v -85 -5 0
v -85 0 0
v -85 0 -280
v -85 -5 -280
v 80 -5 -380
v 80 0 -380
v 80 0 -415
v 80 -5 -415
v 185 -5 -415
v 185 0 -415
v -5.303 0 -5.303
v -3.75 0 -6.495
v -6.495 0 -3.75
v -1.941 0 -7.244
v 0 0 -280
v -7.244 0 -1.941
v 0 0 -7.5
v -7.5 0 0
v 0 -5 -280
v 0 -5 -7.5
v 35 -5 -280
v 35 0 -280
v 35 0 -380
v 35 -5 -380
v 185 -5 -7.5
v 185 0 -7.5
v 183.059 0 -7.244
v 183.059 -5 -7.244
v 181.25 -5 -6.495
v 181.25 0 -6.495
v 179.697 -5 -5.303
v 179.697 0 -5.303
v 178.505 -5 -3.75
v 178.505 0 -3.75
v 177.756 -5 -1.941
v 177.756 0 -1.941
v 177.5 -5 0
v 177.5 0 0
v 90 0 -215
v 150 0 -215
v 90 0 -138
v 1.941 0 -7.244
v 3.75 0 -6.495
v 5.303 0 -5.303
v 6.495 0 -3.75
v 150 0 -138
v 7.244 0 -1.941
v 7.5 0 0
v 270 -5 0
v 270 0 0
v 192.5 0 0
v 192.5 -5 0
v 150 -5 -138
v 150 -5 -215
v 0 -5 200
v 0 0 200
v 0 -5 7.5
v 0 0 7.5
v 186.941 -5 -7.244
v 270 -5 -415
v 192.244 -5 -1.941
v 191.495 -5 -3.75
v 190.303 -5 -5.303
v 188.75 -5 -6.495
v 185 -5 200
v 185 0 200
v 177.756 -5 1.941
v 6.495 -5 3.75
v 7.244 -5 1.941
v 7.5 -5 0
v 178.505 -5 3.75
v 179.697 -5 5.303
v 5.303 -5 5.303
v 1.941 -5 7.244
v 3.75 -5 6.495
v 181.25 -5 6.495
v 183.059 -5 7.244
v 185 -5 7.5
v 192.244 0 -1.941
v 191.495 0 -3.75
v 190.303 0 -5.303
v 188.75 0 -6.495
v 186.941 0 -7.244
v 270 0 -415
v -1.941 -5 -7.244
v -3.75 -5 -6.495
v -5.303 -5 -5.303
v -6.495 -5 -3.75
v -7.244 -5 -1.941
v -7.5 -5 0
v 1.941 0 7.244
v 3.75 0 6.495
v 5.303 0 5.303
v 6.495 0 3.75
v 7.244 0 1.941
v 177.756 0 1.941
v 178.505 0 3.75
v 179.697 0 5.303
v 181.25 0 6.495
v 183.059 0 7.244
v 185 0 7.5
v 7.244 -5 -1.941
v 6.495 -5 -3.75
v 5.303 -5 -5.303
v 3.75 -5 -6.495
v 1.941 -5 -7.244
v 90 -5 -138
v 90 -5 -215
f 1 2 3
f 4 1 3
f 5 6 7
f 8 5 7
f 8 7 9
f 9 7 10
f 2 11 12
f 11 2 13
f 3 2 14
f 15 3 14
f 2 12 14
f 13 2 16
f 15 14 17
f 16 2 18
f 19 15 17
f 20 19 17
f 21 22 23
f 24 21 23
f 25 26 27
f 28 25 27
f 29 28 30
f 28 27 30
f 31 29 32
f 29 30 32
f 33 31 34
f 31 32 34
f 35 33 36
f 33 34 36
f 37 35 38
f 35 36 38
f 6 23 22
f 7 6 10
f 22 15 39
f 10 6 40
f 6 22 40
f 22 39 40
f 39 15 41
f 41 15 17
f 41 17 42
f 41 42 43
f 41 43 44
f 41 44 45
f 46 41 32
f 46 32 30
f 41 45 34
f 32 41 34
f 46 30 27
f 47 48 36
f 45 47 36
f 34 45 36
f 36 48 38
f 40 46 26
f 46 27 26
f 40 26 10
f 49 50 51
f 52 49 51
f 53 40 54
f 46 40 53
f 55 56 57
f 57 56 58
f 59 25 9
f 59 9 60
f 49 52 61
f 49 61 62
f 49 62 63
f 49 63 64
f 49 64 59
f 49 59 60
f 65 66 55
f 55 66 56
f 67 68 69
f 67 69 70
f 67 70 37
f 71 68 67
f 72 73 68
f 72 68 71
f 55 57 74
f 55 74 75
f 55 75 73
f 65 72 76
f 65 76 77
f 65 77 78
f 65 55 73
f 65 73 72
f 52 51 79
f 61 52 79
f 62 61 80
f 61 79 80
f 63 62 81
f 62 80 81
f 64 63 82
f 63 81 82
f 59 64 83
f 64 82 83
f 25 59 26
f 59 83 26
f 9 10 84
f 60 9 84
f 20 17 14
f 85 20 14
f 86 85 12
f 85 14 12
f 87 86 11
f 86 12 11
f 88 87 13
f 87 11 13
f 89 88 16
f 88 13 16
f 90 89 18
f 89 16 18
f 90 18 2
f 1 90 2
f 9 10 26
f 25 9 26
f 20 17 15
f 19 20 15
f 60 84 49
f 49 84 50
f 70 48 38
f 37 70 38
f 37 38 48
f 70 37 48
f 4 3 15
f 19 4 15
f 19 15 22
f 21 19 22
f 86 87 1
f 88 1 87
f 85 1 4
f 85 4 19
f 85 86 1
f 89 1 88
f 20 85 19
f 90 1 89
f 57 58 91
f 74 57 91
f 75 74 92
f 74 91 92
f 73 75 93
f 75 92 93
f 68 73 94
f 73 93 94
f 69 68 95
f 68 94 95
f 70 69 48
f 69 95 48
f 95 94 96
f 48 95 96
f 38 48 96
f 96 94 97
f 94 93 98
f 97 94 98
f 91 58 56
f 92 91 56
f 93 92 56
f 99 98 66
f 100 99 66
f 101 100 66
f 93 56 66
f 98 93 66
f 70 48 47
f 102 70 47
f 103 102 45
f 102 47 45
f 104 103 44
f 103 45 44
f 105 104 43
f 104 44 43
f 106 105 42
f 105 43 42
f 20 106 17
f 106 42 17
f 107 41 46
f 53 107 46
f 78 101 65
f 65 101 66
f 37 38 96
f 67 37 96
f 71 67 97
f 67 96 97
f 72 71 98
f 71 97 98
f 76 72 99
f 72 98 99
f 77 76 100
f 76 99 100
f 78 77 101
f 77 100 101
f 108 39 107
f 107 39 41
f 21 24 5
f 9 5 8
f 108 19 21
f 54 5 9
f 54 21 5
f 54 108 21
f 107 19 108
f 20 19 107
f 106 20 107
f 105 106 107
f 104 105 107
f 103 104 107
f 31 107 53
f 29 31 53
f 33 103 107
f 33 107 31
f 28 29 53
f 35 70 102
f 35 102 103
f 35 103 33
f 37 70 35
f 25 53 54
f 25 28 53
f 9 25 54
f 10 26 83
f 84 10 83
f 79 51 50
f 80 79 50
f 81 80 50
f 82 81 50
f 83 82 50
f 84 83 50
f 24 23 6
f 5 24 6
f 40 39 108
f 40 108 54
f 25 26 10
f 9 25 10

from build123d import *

# Parameters (mm, degrees)
F1_DEPTH      = 5
F2_W          = 60
F2_H          = 77
F3_DEPTH      = 25
F3_DEPTH_BACK = 25
F5_DEPTH      = 5


with BuildPart() as f1:
    # F0 (on Front) → F1 (new body)
    with BuildSketch(Plane.XZ):
        with BuildLine():
            Line((177.5, 0), (7.5, 0))
            ThreePointArc((7.5, 0), (5.3033008589, -5.3033008589), (0, -7.5))
            Line((0, -7.5), (0, -215))
            Line((0, -215), (0, -280))
            Line((0, -280), (35, -280))
            Line((35, -280), (35, -380))
            Line((35, -380), (80, -380))
            Line((80, -380), (80, -415))
            Line((80, -415), (185, -415))
            Line((185, -415), (185, -7.5))
            ThreePointArc((185, -7.5), (179.6966991411, -5.3033008589), (177.5, 0))
        make_face()
    extrude(amount=F1_DEPTH)

    # F2 (on Front) → F3 (cut, two sides)
    with BuildSketch(Plane.XZ) as f3_sk:
        with Locations((120, -176.5)):
            Rectangle(F2_W, F2_H)
    extrude(amount=-F3_DEPTH, mode=Mode.SUBTRACT)
    extrude(f3_sk.sketch, amount=F3_DEPTH_BACK, mode=Mode.SUBTRACT)


with BuildPart() as f5:
    # F4 (on Front) → F5 (new body)
    with BuildSketch(Plane.XZ):
        with BuildLine():
            ThreePointArc((0, -7.5), (-5.3033008589, -5.3033008589), (-7.5, 0))
            Line((-7.5, 0), (-85, 0))
            Line((-85, 0), (-85, -280))
            Line((-85, -280), (0, -280))
            Line((0, -280), (0, -7.5))
        make_face()
    extrude(amount=F5_DEPTH)


with BuildPart() as f5b:
    # F4 (on Front) → F5, piece 2 (new body)
    with BuildSketch(Plane.XZ):
        with BuildLine():
            ThreePointArc((192.5, 0), (190.3033008589, -5.3033008589), (185, -7.5))
            Line((185, -7.5), (185, -415))
            Line((185, -415), (270, -415))
            Line((270, -415), (270, 0))
            Line((270, 0), (192.5, 0))
        make_face()
    extrude(amount=F5_DEPTH)


with BuildPart() as f5c:
    # F4 (on Front) → F5, piece 3 (new body)
    with BuildSketch(Plane.XZ):
        with BuildLine():
            ThreePointArc((0, 7.5), (5.3033008589, 5.3033008589), (7.5, 0))
            Line((7.5, 0), (177.5, 0))
            ThreePointArc((177.5, 0), (179.6966991411, 5.3033008589), (185, 7.5))
            Line((185, 7.5), (185, 200))
            Line((185, 200), (0, 200))
            Line((0, 200), (0, 7.5))
        make_face()
    extrude(amount=F5_DEPTH)


solid = Compound([f1.part, f5.part, f5b.part, f5c.part])
